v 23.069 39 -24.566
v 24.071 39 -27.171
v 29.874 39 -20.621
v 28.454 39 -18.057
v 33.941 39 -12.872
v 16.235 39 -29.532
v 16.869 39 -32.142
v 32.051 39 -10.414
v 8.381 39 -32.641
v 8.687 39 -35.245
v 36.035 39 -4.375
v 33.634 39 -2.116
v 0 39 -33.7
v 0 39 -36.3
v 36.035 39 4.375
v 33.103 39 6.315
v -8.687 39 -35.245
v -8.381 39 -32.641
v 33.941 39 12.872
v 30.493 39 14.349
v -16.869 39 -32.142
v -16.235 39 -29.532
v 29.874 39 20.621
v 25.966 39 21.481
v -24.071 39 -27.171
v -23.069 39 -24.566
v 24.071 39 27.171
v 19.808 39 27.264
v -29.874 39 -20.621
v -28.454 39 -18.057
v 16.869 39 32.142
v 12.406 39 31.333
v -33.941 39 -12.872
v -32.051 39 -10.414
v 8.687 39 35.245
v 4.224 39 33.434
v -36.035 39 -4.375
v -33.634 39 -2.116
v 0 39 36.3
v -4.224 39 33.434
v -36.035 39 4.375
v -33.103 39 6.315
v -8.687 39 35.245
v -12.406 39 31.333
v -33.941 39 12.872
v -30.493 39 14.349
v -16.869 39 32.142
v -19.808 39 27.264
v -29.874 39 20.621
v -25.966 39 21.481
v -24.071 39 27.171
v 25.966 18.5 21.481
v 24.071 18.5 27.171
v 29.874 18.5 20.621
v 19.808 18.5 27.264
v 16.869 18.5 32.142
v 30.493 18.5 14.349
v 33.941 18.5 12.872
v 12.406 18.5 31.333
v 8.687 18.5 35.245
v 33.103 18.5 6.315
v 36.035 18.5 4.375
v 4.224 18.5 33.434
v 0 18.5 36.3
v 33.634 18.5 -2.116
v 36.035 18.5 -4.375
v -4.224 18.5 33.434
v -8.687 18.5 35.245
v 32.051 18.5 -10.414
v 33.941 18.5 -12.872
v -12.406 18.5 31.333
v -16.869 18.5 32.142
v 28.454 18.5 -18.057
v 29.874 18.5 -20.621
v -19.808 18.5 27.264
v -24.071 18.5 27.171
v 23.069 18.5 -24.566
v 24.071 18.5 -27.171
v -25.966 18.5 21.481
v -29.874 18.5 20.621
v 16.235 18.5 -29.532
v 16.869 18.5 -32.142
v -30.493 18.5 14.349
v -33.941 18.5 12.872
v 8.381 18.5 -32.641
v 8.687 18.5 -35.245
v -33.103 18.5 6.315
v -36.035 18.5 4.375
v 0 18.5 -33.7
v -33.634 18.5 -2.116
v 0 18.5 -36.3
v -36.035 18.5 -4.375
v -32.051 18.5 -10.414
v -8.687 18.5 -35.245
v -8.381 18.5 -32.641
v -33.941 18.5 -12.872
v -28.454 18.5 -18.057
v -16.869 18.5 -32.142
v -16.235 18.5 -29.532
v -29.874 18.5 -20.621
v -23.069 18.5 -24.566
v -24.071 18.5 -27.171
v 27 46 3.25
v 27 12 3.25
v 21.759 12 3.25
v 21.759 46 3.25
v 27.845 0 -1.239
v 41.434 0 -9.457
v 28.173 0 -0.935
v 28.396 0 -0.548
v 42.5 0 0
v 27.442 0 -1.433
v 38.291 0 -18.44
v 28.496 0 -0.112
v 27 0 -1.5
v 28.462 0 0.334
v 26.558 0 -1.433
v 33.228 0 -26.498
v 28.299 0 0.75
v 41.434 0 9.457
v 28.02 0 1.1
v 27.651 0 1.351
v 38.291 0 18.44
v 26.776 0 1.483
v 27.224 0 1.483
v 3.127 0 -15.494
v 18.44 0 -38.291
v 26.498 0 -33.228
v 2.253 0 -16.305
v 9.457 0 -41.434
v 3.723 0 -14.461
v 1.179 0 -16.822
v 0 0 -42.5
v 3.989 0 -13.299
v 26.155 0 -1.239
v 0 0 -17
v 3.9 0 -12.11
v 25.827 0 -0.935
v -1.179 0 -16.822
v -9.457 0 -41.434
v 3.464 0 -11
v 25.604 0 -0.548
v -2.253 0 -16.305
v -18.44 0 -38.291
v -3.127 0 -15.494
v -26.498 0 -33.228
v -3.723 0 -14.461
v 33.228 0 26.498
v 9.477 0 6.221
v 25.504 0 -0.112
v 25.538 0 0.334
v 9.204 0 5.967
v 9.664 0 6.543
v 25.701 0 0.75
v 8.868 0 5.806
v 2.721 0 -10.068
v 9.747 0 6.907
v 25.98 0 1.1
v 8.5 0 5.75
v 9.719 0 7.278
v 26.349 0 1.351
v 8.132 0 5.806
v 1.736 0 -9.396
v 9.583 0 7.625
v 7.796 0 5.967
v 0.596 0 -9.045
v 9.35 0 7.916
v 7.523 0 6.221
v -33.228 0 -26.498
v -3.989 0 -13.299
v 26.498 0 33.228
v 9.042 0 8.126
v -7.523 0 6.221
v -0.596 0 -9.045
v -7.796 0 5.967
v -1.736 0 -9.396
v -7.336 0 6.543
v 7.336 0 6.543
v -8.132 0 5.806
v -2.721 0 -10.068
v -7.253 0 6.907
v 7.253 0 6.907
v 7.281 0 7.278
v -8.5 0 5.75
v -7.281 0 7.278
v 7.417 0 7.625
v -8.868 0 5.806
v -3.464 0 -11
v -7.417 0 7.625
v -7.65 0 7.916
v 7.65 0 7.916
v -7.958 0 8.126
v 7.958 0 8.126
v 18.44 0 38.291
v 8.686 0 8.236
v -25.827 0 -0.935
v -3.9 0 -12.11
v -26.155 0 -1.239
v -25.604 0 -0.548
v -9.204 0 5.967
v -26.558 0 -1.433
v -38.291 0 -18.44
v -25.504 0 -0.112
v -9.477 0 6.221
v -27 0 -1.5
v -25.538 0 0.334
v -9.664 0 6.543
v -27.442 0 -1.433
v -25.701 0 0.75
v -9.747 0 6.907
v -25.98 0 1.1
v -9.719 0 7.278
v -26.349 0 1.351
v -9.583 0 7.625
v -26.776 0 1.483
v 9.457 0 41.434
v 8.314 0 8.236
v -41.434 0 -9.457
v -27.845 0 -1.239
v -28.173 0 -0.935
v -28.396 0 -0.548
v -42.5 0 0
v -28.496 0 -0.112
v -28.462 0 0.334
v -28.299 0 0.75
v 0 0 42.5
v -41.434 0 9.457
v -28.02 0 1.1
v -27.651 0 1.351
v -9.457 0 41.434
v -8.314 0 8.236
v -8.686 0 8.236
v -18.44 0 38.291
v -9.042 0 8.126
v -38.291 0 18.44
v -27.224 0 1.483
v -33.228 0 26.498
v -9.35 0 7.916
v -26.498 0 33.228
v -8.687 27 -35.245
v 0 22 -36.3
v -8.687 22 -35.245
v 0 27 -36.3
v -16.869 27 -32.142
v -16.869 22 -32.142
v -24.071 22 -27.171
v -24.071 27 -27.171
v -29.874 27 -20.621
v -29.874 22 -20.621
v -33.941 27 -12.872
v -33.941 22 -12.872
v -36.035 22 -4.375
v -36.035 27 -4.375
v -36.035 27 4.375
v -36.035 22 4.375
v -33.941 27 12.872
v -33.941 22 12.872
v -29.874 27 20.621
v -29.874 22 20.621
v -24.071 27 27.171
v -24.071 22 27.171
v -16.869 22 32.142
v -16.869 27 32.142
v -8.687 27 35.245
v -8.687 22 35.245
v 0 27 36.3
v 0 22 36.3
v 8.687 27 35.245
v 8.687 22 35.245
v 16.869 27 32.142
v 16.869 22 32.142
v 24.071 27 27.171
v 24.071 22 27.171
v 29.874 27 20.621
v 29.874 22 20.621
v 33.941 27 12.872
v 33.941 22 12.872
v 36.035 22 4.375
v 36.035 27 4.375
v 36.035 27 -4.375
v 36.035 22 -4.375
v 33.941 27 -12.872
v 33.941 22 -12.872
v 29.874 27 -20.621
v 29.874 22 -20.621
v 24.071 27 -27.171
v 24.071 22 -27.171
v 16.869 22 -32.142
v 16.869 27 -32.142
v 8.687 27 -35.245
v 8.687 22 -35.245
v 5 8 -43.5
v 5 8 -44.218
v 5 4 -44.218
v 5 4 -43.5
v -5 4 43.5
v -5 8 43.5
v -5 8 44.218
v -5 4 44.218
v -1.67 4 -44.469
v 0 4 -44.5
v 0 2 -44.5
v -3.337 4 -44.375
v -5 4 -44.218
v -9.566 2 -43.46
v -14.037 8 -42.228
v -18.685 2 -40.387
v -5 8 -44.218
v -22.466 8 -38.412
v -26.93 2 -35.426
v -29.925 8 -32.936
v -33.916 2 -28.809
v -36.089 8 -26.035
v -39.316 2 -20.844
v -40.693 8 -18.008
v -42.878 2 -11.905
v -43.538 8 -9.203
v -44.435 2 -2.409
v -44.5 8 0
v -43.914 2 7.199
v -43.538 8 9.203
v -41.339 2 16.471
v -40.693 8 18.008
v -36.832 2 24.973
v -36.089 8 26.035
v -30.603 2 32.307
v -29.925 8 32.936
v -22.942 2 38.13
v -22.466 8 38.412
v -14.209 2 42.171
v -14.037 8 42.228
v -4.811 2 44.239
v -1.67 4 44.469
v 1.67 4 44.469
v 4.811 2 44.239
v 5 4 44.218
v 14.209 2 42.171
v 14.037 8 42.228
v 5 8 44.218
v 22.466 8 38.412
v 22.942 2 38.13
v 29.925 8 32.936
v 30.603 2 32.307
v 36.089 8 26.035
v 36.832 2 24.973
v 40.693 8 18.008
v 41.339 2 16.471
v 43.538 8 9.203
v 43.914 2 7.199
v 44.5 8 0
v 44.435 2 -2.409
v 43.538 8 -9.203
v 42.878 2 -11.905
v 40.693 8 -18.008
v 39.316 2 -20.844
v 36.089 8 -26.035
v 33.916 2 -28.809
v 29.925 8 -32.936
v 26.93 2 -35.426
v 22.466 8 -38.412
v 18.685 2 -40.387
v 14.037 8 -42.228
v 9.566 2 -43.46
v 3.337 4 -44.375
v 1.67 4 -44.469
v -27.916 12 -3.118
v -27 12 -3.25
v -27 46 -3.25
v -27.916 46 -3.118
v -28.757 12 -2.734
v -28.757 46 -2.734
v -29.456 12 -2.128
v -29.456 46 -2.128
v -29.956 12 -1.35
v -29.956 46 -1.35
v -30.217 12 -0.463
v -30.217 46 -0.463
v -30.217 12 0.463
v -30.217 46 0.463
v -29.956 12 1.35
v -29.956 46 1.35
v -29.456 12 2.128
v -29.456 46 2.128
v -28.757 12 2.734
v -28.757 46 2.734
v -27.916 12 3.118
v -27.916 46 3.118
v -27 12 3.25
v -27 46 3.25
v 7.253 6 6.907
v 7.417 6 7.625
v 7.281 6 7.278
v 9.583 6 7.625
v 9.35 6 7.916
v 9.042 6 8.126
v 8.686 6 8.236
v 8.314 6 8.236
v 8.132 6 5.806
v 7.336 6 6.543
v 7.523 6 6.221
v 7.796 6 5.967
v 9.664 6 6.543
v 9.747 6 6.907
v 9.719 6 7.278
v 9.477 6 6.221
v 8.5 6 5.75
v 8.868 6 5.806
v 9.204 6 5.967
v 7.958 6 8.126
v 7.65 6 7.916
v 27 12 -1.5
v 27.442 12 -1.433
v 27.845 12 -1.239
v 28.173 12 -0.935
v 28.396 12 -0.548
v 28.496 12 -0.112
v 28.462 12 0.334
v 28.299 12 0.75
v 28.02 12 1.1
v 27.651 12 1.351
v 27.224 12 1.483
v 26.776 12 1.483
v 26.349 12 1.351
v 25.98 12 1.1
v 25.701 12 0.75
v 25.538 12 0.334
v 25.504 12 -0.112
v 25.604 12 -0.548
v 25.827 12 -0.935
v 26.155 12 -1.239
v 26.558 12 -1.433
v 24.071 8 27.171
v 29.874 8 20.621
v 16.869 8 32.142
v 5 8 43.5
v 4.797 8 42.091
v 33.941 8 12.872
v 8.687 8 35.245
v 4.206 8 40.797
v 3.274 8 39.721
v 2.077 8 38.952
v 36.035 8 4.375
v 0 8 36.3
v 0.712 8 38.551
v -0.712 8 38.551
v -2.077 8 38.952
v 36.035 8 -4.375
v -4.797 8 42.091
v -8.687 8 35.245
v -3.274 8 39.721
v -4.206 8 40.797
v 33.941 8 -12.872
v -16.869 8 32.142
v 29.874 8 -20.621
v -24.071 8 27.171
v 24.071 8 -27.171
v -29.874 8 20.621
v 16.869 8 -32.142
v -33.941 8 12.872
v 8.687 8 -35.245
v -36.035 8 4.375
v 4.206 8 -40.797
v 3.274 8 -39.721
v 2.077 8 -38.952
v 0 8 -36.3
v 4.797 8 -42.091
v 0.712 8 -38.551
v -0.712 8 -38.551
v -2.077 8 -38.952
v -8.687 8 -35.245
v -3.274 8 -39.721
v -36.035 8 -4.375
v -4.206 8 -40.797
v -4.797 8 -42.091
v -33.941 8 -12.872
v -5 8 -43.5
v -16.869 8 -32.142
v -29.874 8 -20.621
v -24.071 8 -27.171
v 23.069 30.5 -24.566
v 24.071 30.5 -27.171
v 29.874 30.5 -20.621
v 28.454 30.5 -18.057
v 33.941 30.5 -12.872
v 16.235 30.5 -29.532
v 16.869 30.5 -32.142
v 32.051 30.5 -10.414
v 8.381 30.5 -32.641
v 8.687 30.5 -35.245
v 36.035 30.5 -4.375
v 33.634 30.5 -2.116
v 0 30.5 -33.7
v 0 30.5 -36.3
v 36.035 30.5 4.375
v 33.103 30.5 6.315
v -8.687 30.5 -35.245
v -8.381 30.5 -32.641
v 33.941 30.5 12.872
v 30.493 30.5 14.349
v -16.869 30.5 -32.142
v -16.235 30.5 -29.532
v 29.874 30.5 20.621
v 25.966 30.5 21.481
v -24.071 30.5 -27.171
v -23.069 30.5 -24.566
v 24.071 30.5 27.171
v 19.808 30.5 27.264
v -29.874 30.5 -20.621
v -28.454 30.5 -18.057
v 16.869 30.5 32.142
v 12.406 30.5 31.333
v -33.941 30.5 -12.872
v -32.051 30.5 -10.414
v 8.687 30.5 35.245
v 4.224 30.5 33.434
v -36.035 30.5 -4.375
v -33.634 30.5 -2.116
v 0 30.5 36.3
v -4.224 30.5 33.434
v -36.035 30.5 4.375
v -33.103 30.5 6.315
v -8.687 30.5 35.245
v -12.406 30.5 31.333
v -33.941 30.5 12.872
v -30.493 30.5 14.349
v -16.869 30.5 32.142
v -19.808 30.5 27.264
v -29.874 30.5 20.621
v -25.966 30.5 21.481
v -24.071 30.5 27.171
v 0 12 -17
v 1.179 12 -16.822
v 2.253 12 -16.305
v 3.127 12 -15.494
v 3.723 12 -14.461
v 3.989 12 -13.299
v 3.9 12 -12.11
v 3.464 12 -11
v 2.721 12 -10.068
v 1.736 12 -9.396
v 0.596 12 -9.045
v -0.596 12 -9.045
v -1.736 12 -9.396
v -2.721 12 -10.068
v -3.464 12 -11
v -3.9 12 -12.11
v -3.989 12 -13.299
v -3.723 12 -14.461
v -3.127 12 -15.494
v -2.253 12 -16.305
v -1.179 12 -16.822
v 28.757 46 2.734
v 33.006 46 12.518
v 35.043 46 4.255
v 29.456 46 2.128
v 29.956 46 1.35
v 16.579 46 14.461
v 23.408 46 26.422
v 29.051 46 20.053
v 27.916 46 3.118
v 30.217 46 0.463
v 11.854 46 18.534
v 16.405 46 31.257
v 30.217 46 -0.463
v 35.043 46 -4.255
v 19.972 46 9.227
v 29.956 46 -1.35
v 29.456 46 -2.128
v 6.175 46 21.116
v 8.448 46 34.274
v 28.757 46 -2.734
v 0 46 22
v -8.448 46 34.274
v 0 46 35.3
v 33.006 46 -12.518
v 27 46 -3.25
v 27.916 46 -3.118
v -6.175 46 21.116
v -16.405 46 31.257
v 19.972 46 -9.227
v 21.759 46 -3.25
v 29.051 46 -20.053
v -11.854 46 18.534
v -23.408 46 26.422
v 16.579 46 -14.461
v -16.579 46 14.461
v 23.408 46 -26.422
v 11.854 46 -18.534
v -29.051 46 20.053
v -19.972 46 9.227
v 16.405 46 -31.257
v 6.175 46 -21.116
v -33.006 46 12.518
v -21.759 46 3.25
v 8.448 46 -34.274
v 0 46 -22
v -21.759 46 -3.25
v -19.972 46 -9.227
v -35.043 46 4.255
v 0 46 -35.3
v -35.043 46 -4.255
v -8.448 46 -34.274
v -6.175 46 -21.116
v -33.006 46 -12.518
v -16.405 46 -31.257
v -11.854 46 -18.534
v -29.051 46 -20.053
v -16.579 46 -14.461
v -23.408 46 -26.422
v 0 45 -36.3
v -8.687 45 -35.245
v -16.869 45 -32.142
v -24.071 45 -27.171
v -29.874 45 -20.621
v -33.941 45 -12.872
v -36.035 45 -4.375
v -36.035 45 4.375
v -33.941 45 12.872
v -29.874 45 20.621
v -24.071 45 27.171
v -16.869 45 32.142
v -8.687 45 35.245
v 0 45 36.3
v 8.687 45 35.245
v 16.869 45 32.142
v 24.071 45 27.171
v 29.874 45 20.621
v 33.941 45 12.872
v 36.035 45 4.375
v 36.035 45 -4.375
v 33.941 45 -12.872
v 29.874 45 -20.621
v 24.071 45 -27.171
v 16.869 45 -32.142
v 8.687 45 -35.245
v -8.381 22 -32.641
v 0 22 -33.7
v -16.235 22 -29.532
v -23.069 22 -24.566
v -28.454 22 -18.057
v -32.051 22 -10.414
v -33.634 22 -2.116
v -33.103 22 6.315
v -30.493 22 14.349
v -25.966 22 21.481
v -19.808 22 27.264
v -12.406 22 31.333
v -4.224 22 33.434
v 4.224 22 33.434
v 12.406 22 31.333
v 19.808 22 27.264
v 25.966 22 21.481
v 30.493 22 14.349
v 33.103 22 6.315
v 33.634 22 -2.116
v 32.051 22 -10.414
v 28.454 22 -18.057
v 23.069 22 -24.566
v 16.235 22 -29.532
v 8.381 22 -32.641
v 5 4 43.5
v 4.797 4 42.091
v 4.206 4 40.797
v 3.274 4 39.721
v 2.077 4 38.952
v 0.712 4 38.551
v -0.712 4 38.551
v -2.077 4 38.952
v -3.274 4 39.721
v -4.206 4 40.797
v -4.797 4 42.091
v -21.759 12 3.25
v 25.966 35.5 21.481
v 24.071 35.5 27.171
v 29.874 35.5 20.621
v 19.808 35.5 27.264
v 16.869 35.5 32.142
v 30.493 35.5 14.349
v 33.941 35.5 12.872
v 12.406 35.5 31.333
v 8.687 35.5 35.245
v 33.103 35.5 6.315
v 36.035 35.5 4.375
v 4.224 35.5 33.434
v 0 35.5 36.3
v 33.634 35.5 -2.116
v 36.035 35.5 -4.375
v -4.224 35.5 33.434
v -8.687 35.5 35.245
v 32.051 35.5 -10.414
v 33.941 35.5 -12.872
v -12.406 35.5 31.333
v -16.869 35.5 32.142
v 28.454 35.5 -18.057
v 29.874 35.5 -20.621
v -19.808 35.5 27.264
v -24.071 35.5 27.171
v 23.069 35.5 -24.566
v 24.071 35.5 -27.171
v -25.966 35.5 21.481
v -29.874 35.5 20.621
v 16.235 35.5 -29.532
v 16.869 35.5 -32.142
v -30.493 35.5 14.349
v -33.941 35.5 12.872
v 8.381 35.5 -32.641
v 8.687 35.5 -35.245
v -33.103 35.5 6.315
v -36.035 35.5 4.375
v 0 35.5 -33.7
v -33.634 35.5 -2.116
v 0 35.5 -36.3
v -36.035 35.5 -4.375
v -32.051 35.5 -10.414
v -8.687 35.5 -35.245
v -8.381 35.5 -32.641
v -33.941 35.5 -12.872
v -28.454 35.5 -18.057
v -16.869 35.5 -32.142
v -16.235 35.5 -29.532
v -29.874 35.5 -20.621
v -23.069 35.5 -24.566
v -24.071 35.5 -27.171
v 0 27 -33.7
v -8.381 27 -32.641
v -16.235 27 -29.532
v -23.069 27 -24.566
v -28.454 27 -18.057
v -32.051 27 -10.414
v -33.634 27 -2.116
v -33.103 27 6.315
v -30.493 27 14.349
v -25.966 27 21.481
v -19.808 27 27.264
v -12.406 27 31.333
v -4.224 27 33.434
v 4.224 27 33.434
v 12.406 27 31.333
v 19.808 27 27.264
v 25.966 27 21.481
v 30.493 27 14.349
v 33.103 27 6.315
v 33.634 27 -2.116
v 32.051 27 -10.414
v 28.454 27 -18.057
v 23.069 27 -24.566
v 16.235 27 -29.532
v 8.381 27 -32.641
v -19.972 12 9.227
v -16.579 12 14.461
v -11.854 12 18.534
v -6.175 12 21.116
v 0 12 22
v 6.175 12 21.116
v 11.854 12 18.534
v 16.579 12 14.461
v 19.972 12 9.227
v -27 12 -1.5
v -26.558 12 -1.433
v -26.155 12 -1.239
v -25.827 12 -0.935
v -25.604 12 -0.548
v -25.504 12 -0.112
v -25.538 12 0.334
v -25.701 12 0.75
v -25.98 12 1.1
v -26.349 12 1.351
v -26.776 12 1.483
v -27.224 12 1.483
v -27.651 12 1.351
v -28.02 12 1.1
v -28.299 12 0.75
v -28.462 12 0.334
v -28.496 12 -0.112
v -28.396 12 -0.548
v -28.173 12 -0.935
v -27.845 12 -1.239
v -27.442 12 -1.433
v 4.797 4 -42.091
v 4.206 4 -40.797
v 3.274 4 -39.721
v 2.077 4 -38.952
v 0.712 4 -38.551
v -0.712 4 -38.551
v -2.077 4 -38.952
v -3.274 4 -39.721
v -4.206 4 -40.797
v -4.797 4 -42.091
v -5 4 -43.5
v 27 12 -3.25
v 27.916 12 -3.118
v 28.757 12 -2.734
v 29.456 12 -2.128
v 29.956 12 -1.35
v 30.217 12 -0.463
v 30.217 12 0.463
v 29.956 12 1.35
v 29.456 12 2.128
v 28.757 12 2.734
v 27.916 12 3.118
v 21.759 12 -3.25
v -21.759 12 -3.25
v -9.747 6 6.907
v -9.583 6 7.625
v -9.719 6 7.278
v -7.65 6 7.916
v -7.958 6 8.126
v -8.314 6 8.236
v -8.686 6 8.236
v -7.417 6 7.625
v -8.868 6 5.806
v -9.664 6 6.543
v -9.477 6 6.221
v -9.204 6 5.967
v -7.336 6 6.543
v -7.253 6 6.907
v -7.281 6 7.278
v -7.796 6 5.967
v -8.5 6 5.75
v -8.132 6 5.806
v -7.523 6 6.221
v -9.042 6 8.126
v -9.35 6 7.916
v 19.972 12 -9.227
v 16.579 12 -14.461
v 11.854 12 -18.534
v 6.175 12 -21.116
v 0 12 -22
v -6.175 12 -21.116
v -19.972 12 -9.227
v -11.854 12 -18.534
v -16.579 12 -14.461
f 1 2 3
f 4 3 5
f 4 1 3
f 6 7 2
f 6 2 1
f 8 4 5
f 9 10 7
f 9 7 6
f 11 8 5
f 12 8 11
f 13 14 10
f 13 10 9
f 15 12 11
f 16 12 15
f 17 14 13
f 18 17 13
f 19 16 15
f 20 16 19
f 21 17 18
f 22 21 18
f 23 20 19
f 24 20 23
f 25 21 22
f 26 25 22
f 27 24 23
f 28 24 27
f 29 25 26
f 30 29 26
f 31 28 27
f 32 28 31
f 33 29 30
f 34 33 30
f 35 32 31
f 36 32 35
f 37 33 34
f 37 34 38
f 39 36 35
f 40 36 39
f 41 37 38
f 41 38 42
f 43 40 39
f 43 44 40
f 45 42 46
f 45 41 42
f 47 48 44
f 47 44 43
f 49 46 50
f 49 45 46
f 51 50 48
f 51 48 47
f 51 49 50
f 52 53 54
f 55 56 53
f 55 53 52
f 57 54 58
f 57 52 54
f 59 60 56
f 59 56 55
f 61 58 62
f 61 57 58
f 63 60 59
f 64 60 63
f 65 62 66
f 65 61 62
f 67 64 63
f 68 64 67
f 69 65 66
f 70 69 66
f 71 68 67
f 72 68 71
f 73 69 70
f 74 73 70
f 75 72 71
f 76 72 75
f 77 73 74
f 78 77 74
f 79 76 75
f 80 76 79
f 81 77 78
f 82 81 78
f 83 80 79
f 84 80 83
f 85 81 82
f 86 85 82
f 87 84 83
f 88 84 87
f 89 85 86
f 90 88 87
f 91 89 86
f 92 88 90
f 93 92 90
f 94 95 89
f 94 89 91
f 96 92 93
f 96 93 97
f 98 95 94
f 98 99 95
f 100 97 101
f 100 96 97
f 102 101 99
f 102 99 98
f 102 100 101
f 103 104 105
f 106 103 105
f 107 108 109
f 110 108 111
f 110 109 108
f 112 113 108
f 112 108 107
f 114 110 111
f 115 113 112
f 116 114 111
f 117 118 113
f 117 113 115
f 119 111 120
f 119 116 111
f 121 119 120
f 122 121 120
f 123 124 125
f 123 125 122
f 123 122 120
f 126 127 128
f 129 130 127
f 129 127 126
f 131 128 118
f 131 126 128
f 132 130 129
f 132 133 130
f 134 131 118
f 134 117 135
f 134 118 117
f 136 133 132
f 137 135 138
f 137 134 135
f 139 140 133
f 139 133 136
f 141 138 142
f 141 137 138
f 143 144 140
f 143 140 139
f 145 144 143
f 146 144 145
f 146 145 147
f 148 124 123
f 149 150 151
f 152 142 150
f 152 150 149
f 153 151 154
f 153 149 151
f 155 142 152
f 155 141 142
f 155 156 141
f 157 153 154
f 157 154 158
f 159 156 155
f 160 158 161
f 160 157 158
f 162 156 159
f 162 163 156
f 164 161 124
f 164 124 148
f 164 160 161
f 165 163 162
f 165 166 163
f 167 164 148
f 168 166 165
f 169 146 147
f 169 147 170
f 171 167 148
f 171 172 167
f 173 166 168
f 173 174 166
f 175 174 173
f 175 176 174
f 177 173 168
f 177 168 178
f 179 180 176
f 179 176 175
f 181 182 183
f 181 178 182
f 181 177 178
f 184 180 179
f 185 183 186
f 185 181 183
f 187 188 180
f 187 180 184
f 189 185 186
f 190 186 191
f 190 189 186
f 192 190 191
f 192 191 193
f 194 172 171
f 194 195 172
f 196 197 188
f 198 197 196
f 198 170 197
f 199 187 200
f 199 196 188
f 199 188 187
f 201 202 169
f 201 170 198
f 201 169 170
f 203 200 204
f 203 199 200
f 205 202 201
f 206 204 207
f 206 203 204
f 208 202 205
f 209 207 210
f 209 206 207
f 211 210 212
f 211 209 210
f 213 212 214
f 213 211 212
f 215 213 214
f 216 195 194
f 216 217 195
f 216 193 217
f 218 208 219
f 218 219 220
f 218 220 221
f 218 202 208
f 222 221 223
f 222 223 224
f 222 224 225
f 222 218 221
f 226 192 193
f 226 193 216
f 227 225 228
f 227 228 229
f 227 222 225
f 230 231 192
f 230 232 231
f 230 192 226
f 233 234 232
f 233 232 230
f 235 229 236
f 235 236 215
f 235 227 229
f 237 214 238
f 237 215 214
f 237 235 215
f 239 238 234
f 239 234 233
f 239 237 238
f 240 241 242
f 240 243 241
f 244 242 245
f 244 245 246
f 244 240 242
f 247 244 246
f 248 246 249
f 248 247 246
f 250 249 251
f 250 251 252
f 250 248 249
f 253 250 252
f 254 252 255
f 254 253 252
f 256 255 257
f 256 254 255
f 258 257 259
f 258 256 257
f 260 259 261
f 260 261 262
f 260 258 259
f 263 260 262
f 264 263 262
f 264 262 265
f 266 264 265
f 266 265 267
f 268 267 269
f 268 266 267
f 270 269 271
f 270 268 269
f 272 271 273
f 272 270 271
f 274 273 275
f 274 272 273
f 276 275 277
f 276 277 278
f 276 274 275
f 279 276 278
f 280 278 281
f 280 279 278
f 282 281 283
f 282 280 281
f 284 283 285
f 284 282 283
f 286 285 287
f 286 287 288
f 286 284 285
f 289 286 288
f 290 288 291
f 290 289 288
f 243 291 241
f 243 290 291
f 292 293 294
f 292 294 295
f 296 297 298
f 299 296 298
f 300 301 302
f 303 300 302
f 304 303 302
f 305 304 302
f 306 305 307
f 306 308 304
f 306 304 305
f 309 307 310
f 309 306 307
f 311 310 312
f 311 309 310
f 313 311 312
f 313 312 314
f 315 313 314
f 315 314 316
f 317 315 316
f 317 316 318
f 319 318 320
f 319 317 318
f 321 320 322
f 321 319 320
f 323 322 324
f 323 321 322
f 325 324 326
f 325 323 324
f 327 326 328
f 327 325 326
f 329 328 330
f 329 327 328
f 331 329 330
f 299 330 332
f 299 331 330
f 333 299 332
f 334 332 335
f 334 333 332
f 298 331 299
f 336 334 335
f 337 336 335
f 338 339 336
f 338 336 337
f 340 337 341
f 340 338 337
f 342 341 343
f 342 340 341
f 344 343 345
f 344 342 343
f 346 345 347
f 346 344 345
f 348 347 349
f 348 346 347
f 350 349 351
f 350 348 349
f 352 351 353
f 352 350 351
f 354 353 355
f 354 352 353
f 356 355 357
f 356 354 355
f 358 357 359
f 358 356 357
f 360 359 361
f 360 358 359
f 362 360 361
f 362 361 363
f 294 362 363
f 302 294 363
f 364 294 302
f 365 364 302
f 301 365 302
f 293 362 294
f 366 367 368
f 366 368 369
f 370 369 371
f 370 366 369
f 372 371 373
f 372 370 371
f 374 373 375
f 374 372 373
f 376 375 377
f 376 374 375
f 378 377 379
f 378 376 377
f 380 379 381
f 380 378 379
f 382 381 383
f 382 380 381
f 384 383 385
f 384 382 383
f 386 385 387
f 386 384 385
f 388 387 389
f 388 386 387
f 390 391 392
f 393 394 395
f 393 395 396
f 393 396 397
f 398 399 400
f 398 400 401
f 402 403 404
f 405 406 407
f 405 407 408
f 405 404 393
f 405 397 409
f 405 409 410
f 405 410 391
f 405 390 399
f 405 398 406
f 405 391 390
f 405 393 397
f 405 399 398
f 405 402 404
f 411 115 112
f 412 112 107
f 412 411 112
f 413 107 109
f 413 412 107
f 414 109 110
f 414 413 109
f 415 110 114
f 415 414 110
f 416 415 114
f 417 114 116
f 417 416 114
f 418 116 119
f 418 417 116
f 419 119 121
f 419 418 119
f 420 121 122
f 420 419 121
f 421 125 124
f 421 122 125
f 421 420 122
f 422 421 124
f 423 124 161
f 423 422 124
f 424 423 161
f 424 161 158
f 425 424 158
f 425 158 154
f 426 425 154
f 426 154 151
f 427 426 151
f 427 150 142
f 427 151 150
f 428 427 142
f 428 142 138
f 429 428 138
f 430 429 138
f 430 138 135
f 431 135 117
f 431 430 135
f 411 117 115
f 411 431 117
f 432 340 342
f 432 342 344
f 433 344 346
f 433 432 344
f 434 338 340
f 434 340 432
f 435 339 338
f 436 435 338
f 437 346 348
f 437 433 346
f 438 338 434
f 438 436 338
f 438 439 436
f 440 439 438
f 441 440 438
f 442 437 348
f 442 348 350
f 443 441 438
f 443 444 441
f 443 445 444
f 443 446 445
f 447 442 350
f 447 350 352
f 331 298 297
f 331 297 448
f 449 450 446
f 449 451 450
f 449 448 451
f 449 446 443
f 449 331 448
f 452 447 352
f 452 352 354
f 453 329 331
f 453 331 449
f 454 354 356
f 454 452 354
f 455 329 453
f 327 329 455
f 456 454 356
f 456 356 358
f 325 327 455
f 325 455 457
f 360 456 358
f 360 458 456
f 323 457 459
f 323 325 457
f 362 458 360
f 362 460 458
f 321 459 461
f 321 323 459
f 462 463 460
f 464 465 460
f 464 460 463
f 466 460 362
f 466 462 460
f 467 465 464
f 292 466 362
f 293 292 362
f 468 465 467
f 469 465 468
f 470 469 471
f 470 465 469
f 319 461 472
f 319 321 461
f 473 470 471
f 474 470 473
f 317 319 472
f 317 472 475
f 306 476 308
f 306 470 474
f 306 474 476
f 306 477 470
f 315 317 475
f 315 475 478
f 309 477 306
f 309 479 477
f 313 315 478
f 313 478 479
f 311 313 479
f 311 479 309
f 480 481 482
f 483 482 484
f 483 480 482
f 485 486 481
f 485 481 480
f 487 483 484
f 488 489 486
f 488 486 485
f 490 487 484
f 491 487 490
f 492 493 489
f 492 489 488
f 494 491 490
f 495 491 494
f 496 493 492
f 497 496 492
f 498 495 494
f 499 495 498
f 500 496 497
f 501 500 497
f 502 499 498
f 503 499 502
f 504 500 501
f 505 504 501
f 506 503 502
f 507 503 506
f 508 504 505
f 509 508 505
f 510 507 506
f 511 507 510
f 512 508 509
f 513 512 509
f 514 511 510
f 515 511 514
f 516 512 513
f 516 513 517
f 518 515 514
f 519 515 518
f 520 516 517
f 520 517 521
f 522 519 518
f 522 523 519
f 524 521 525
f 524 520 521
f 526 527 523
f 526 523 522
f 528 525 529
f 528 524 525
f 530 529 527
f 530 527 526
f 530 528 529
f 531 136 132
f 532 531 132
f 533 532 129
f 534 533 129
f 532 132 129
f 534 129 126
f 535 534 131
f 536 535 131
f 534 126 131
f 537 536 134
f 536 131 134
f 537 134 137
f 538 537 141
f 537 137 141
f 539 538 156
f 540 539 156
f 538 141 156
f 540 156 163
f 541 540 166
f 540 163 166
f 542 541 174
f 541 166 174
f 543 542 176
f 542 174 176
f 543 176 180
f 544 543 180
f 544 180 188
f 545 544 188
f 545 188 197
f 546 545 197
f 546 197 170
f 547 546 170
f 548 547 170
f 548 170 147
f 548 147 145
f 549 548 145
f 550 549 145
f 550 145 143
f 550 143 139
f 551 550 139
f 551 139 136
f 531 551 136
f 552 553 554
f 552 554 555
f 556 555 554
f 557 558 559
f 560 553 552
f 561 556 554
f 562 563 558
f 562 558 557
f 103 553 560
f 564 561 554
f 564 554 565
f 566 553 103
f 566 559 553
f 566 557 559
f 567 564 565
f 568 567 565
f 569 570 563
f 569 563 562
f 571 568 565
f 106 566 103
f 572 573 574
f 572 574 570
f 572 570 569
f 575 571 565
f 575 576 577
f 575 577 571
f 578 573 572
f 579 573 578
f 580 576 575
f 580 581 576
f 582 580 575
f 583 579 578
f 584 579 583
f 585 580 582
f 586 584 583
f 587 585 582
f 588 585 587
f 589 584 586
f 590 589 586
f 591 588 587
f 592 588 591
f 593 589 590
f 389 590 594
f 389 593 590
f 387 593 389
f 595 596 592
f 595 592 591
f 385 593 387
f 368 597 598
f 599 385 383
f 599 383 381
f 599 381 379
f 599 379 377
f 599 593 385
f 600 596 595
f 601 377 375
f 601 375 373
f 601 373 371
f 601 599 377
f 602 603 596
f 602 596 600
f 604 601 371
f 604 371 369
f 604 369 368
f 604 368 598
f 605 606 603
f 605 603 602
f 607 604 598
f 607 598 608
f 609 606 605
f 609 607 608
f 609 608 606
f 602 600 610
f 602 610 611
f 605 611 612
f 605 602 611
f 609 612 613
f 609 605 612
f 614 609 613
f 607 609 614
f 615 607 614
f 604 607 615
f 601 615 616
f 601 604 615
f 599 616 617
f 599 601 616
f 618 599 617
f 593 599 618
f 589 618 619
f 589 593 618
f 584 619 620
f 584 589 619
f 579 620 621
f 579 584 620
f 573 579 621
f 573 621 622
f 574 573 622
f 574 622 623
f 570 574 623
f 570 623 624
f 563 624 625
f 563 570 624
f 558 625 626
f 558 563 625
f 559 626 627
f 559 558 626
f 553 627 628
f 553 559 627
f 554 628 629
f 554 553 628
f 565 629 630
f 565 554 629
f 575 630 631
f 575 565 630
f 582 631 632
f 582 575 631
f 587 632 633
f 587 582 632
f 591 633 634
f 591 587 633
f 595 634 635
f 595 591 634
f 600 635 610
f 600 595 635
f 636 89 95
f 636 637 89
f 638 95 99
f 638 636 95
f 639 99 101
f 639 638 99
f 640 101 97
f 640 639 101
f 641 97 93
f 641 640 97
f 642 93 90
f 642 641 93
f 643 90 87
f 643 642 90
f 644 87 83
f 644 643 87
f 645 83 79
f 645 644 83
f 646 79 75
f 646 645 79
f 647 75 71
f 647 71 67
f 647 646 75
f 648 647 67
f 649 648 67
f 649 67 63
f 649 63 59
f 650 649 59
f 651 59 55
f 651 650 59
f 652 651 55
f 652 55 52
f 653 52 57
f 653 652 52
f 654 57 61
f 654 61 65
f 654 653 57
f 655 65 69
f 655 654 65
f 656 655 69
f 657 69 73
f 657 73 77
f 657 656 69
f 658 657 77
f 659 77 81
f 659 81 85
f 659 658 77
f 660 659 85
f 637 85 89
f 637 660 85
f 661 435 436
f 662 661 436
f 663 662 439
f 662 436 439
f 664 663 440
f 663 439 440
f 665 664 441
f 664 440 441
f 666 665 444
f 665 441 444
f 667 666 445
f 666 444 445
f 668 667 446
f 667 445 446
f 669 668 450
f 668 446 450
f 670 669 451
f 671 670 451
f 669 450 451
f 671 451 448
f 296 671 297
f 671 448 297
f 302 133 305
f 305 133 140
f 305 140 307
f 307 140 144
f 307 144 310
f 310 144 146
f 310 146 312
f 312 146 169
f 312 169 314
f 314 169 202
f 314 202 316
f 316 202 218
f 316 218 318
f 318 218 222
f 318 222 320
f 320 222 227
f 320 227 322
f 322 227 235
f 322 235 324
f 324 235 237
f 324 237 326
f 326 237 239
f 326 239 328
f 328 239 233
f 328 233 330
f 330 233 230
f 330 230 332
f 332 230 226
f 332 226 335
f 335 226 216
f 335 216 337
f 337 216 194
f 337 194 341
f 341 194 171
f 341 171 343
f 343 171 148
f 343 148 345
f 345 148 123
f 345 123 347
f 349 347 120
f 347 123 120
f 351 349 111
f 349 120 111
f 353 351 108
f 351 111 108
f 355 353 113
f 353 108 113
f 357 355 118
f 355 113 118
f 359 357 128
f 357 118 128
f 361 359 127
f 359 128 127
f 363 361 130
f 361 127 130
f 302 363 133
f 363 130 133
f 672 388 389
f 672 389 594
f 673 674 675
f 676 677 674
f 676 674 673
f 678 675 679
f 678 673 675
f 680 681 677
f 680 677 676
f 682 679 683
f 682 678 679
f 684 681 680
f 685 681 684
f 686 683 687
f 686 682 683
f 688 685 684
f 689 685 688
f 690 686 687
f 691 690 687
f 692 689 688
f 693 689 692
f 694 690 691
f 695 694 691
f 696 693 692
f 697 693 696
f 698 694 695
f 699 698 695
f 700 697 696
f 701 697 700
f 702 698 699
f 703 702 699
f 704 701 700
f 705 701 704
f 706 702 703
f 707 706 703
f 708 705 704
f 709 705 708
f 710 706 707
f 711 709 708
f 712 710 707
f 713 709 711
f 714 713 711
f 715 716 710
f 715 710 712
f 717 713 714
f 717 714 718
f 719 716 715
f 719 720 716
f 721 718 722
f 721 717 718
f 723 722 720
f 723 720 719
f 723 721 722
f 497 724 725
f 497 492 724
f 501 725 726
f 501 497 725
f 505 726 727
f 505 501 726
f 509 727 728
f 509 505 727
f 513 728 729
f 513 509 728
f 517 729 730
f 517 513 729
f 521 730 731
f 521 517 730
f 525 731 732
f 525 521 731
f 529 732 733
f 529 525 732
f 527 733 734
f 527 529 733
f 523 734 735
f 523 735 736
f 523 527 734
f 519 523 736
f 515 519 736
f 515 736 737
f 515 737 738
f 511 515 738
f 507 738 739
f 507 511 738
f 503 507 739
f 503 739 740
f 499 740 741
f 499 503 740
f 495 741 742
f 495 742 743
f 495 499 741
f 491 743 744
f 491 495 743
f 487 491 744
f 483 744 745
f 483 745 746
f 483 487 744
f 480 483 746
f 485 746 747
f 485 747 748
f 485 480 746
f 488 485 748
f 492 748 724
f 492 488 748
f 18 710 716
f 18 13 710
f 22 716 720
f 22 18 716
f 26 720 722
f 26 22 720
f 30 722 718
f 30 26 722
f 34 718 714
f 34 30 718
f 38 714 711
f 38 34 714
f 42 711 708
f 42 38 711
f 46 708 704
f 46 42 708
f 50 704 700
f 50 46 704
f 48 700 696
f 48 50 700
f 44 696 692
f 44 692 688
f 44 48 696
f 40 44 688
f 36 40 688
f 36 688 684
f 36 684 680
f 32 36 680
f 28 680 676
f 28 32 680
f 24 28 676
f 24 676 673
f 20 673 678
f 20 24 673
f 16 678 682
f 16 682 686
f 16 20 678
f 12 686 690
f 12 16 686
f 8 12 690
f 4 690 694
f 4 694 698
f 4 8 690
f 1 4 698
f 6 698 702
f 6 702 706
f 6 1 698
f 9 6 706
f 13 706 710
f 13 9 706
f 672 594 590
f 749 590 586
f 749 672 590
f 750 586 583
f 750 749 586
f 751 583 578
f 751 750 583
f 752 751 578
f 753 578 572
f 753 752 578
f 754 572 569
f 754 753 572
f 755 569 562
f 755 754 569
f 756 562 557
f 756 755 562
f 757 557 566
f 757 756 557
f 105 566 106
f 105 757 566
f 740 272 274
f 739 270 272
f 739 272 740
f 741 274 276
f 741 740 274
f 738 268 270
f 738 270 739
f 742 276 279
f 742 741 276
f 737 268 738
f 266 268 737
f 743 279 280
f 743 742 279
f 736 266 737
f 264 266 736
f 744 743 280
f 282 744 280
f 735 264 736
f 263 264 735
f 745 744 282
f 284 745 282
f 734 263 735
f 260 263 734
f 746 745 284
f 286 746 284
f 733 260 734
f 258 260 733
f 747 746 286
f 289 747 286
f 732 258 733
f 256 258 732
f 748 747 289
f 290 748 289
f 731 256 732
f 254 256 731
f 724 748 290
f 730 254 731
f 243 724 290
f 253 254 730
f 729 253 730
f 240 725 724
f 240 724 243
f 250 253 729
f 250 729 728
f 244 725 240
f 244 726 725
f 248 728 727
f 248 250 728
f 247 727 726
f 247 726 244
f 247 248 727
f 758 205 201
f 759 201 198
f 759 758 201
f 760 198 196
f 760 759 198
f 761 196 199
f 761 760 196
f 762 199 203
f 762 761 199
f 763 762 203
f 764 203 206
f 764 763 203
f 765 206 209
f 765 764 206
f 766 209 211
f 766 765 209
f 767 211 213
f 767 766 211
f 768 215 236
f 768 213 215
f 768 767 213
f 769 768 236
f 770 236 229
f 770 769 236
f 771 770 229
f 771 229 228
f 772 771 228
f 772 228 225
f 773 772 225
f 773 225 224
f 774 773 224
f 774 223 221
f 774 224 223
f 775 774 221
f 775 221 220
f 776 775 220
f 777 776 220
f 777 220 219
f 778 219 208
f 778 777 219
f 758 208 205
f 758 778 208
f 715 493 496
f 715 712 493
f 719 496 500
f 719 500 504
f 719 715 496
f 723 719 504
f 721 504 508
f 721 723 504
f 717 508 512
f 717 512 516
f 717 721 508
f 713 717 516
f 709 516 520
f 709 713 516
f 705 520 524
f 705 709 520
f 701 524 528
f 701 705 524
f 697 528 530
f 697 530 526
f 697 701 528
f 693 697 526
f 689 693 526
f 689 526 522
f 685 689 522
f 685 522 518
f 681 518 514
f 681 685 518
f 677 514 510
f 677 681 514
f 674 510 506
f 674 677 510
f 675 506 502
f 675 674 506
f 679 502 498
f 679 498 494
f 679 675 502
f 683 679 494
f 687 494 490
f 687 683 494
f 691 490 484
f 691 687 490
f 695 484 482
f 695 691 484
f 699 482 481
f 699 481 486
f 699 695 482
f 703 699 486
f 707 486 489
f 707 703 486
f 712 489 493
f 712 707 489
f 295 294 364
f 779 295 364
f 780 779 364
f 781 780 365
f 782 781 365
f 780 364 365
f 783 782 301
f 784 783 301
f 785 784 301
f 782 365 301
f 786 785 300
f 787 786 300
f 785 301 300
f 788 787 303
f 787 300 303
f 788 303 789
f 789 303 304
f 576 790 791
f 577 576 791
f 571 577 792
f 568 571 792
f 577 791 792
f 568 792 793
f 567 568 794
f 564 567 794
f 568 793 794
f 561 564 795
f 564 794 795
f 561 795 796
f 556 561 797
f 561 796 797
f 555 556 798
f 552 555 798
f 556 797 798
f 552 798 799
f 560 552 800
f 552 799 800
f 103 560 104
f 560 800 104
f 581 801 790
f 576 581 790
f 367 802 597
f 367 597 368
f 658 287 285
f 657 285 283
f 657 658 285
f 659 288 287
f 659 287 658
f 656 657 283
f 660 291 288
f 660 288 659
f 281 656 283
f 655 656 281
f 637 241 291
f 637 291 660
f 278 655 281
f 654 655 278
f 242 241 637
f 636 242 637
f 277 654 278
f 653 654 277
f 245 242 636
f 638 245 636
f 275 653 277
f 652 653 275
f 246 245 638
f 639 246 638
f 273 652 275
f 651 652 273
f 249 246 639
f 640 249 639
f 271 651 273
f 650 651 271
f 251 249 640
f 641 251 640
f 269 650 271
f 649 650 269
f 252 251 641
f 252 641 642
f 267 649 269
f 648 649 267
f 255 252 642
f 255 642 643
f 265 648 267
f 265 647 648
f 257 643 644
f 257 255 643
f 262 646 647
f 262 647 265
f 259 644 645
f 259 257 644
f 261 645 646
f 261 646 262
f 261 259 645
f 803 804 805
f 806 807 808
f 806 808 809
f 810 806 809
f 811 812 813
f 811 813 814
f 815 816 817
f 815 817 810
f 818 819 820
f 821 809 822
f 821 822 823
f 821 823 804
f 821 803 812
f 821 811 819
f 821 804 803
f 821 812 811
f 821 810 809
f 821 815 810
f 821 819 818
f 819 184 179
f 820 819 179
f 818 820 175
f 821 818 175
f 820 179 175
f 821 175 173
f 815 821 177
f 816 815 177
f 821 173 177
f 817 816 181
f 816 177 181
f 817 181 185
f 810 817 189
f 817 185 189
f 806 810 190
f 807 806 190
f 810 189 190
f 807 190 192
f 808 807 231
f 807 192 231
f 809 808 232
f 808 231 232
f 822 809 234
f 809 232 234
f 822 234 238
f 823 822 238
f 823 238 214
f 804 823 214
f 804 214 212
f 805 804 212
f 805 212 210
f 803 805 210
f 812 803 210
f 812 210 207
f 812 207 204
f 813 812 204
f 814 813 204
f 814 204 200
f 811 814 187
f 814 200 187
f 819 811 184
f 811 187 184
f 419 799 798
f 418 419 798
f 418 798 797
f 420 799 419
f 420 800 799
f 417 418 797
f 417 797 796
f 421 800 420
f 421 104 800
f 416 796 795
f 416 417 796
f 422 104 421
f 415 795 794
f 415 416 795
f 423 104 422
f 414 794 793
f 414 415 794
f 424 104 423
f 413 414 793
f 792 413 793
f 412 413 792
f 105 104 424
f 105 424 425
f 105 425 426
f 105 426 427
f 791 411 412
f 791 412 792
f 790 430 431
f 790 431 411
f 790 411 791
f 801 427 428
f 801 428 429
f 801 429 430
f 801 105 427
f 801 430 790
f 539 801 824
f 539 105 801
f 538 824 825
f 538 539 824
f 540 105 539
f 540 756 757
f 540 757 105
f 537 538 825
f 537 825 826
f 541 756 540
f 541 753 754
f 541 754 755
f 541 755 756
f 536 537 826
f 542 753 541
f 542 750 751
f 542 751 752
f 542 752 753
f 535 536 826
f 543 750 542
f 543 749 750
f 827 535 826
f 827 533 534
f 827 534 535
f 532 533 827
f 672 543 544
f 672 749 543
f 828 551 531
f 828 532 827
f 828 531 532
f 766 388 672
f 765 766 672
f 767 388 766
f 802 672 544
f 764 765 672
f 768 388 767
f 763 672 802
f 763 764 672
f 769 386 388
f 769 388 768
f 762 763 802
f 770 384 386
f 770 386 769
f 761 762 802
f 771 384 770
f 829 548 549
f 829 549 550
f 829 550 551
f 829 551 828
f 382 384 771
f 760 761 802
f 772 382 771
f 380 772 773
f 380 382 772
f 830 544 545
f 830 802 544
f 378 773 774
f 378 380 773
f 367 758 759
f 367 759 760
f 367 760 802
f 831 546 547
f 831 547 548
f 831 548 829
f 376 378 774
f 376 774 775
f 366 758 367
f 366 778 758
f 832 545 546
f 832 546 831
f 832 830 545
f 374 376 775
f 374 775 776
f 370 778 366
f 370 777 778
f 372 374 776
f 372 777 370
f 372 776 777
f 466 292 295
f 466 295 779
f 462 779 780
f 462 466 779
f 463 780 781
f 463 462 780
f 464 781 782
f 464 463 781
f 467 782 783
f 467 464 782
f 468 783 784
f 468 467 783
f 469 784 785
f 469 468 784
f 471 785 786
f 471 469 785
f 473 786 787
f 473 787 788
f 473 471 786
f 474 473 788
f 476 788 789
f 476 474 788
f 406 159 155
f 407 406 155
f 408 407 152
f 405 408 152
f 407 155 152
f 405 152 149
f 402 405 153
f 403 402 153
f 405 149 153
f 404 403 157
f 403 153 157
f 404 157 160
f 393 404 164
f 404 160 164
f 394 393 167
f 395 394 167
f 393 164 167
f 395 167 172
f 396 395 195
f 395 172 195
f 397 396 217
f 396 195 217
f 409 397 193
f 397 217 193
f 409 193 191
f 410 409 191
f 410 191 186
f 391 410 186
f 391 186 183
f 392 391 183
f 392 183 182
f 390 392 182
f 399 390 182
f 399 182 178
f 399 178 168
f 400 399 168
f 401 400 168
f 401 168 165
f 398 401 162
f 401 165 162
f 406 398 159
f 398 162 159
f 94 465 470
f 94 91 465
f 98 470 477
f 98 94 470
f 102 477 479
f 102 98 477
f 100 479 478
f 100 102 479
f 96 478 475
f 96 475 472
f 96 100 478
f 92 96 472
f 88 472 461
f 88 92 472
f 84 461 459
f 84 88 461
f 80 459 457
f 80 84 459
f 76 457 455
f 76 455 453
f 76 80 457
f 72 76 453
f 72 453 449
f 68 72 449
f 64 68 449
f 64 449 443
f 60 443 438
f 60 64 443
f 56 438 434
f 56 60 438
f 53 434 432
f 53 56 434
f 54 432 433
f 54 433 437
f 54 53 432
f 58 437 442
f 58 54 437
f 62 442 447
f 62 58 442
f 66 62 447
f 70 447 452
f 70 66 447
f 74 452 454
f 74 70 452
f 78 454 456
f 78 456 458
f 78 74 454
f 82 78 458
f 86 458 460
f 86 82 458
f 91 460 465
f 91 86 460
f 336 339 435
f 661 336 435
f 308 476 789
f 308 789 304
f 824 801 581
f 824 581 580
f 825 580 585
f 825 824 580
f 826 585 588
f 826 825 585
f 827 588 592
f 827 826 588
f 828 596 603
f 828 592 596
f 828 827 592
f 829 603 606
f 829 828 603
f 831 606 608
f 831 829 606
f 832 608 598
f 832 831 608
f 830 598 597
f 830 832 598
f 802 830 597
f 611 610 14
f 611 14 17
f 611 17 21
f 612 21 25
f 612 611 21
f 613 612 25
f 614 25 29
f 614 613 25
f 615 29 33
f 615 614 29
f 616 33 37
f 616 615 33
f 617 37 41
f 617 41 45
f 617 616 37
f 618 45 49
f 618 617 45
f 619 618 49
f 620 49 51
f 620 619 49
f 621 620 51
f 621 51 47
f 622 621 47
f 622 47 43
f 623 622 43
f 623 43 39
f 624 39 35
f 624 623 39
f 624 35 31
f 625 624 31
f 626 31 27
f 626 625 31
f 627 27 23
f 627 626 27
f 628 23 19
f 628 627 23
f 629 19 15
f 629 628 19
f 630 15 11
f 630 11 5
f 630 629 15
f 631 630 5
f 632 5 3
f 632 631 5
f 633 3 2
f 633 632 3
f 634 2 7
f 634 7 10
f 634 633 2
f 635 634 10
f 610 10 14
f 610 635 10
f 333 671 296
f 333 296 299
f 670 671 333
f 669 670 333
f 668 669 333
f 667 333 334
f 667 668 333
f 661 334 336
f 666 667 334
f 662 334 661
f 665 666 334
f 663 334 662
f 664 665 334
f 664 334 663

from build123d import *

# Parameters (mm, degrees)
CORTE_EXTRUS_O1_DEPTH      = 4
CHANFRO1_SIZE              = 1
CORTE_EXTRUS_O2_DEPTH      = 78.951908251
CORTE_EXTRUS_O2_DEPTH_BACK = 12
ESBO_O3_R                  = 1.5
CORTE_EXTRUS_O3_START      = -12
ESBO_O3_5_R                = 1.5
CORTE_EXTRUS_O3_DEPTH      = 66.951908251
CHANFRO2_SIZE              = 2
ESBO_O4_R                  = 1.25
CORTE_EXTRUS_O4_DEPTH      = 6
CORTE_EXTRUS_O5_REACH      = 79.952
ESBO_O4_3_R                = 4


with BuildPart() as part:
    # Esboço1 → Revolução1 (revolve)
    with BuildSketch(Plane.XY, mode=Mode.PRIVATE) as revolu_o1_sk:
        Polygon((44.5, 0), (44.5, 8), (36.3, 8), (36.3, 18.5), (33.7, 18.5), (33.7, 22), (36.3, 22), (36.3, 27), (33.7, 27), (33.7, 30.5), (36.3, 30.5), (36.3, 35.5), (33.7, 35.5), (33.7, 39), (36.3, 39), (36.3, 46), (22, 46), (22, 12), (0, 12), (0, 0), align=None)
    revolve(revolu_o1_sk.sketch.rotate(Axis((0, 0, 0), (0, 1, 0)), 90), axis=Axis((0, 0, 0), (0, 1, 0)))

    # Esboço2 → Corte-extrusão1 (cut)
    with BuildSketch(Plane(origin=(0, 8, 0), x_dir=(1, 0, 0), z_dir=(0, 1, 0))):
        with BuildLine():
            Line((5, 45.5), (5, 43.5))
            ThreePointArc((5, 43.5), (0, 38.5), (-5, 43.5))
            Line((-5, 43.5), (-5, 45.5))
            ThreePointArc((-5, 45.5), (0, 50.5), (5, 45.5))
        make_face()
        with BuildLine():
            Line((5, -45.5), (5, -43.5))
            ThreePointArc((5, -43.5), (0, -38.5), (-5, -43.5))
            Line((-5, -43.5), (-5, -45.5))
            ThreePointArc((-5, -45.5), (0, -50.5), (5, -45.5))
        make_face()
    extrude(amount=-CORTE_EXTRUS_O1_DEPTH, mode=Mode.SUBTRACT)

    # Chanfro1
    chanfro1_edges = [part.edges().sort_by_distance(p)[0] for p in [
        (0, 46, 36.3),
    ]]
    chamfer(chanfro1_edges, length=CHANFRO1_SIZE)

    # Esboço3 → Corte-extrusão2 (cut, two sides: drawn at the far end of the back side and taken through both)
    with BuildSketch(Plane.XZ.offset(-CORTE_EXTRUS_O2_DEPTH_BACK)):
        with Locations(Location((-27, 0, 0), (0, 0, 270))):
            Circle(ESBO_O3_R)
        with Locations(Location((27, 0, 0), (0, 0, 270))):
            Circle(ESBO_O3_R)
    extrude(amount=CORTE_EXTRUS_O2_DEPTH + CORTE_EXTRUS_O2_DEPTH_BACK, mode=Mode.SUBTRACT)

    # Esboço3<5> → Corte-extrusão3 (cut, through all)
    # profile 1 of 2: a face of its own
    with BuildSketch(Plane.XZ.offset(CORTE_EXTRUS_O3_START)):
        with BuildLine():
            Line((-27, 3.25), (-21.5, 3.25))
            ThreePointArc((-21.5, 3.25), (-18.25, 0), (-21.5, -3.25))
            Line((-21.5, -3.25), (-27, -3.25))
            ThreePointArc((-27, -3.25), (-30.25, 0), (-27, 3.25))
        make_face()
        with Locations(Location((-27, 0, 0), (0, 0, 270))):
            Circle(ESBO_O3_5_R, mode=Mode.SUBTRACT)
    # profile 2 of 2: a face of its own
    with BuildSketch(Plane.XZ.offset(CORTE_EXTRUS_O3_START)):
        with BuildLine():
            Line((27, 3.25), (21.5, 3.25))
            ThreePointArc((21.5, 3.25), (18.25, 0), (21.5, -3.25))
            Line((21.5, -3.25), (27, -3.25))
            ThreePointArc((27, -3.25), (30.25, 0), (27, 3.25))
        make_face()
        with Locations(Location((27, 0, 0), (0, 0, 270))):
            Circle(ESBO_O3_5_R, mode=Mode.SUBTRACT)
    extrude(amount=-CORTE_EXTRUS_O3_DEPTH, mode=Mode.SUBTRACT)


with BuildPart() as corte_extrus_o3_kept_piece:
    # of the separate pieces the step leaves, the one the design keeps (corte_extrus_o3_pieces_kept)
    add(part.part.solids().sort_by_distance((0, 45, -36.3))[0])

    # Chanfro2
    chanfro2_edges = [corte_extrus_o3_kept_piece.edges().sort_by_distance(p)[0] for p in [
        (0, 0, 44.5),
    ]]
    chamfer(chanfro2_edges, length=CHANFRO2_SIZE)

    # Esboço4 → Corte-extrusão4 (cut)
    with BuildSketch(Plane.XZ):
        with Locations(Location((-8.5, 7, 0), (0, 0, 270))):
            Circle(ESBO_O4_R)
        with Locations(Location((8.5, 7, 0), (0, 0, 270))):
            Circle(ESBO_O4_R)
    extrude(amount=-CORTE_EXTRUS_O4_DEPTH, mode=Mode.SUBTRACT)

    # Esboço4<3> → Corte-extrusão5 (cut, up to next)
    with BuildSketch(Plane.XZ, mode=Mode.PRIVATE) as corte_extrus_o5_sk1:
        with Locations(Location((0, -13, 0), (0, 0, 270))):
            Circle(ESBO_O4_3_R)
    corte_extrus_o5_tool1 = extrude(corte_extrus_o5_sk1.sketch, amount=-CORTE_EXTRUS_O5_REACH, mode=Mode.PRIVATE) & corte_extrus_o3_kept_piece.part
    add(corte_extrus_o5_tool1.solids().sort_by_distance((0, 0, -13))[0], mode=Mode.SUBTRACT)


solid = corte_extrus_o3_kept_piece.part
